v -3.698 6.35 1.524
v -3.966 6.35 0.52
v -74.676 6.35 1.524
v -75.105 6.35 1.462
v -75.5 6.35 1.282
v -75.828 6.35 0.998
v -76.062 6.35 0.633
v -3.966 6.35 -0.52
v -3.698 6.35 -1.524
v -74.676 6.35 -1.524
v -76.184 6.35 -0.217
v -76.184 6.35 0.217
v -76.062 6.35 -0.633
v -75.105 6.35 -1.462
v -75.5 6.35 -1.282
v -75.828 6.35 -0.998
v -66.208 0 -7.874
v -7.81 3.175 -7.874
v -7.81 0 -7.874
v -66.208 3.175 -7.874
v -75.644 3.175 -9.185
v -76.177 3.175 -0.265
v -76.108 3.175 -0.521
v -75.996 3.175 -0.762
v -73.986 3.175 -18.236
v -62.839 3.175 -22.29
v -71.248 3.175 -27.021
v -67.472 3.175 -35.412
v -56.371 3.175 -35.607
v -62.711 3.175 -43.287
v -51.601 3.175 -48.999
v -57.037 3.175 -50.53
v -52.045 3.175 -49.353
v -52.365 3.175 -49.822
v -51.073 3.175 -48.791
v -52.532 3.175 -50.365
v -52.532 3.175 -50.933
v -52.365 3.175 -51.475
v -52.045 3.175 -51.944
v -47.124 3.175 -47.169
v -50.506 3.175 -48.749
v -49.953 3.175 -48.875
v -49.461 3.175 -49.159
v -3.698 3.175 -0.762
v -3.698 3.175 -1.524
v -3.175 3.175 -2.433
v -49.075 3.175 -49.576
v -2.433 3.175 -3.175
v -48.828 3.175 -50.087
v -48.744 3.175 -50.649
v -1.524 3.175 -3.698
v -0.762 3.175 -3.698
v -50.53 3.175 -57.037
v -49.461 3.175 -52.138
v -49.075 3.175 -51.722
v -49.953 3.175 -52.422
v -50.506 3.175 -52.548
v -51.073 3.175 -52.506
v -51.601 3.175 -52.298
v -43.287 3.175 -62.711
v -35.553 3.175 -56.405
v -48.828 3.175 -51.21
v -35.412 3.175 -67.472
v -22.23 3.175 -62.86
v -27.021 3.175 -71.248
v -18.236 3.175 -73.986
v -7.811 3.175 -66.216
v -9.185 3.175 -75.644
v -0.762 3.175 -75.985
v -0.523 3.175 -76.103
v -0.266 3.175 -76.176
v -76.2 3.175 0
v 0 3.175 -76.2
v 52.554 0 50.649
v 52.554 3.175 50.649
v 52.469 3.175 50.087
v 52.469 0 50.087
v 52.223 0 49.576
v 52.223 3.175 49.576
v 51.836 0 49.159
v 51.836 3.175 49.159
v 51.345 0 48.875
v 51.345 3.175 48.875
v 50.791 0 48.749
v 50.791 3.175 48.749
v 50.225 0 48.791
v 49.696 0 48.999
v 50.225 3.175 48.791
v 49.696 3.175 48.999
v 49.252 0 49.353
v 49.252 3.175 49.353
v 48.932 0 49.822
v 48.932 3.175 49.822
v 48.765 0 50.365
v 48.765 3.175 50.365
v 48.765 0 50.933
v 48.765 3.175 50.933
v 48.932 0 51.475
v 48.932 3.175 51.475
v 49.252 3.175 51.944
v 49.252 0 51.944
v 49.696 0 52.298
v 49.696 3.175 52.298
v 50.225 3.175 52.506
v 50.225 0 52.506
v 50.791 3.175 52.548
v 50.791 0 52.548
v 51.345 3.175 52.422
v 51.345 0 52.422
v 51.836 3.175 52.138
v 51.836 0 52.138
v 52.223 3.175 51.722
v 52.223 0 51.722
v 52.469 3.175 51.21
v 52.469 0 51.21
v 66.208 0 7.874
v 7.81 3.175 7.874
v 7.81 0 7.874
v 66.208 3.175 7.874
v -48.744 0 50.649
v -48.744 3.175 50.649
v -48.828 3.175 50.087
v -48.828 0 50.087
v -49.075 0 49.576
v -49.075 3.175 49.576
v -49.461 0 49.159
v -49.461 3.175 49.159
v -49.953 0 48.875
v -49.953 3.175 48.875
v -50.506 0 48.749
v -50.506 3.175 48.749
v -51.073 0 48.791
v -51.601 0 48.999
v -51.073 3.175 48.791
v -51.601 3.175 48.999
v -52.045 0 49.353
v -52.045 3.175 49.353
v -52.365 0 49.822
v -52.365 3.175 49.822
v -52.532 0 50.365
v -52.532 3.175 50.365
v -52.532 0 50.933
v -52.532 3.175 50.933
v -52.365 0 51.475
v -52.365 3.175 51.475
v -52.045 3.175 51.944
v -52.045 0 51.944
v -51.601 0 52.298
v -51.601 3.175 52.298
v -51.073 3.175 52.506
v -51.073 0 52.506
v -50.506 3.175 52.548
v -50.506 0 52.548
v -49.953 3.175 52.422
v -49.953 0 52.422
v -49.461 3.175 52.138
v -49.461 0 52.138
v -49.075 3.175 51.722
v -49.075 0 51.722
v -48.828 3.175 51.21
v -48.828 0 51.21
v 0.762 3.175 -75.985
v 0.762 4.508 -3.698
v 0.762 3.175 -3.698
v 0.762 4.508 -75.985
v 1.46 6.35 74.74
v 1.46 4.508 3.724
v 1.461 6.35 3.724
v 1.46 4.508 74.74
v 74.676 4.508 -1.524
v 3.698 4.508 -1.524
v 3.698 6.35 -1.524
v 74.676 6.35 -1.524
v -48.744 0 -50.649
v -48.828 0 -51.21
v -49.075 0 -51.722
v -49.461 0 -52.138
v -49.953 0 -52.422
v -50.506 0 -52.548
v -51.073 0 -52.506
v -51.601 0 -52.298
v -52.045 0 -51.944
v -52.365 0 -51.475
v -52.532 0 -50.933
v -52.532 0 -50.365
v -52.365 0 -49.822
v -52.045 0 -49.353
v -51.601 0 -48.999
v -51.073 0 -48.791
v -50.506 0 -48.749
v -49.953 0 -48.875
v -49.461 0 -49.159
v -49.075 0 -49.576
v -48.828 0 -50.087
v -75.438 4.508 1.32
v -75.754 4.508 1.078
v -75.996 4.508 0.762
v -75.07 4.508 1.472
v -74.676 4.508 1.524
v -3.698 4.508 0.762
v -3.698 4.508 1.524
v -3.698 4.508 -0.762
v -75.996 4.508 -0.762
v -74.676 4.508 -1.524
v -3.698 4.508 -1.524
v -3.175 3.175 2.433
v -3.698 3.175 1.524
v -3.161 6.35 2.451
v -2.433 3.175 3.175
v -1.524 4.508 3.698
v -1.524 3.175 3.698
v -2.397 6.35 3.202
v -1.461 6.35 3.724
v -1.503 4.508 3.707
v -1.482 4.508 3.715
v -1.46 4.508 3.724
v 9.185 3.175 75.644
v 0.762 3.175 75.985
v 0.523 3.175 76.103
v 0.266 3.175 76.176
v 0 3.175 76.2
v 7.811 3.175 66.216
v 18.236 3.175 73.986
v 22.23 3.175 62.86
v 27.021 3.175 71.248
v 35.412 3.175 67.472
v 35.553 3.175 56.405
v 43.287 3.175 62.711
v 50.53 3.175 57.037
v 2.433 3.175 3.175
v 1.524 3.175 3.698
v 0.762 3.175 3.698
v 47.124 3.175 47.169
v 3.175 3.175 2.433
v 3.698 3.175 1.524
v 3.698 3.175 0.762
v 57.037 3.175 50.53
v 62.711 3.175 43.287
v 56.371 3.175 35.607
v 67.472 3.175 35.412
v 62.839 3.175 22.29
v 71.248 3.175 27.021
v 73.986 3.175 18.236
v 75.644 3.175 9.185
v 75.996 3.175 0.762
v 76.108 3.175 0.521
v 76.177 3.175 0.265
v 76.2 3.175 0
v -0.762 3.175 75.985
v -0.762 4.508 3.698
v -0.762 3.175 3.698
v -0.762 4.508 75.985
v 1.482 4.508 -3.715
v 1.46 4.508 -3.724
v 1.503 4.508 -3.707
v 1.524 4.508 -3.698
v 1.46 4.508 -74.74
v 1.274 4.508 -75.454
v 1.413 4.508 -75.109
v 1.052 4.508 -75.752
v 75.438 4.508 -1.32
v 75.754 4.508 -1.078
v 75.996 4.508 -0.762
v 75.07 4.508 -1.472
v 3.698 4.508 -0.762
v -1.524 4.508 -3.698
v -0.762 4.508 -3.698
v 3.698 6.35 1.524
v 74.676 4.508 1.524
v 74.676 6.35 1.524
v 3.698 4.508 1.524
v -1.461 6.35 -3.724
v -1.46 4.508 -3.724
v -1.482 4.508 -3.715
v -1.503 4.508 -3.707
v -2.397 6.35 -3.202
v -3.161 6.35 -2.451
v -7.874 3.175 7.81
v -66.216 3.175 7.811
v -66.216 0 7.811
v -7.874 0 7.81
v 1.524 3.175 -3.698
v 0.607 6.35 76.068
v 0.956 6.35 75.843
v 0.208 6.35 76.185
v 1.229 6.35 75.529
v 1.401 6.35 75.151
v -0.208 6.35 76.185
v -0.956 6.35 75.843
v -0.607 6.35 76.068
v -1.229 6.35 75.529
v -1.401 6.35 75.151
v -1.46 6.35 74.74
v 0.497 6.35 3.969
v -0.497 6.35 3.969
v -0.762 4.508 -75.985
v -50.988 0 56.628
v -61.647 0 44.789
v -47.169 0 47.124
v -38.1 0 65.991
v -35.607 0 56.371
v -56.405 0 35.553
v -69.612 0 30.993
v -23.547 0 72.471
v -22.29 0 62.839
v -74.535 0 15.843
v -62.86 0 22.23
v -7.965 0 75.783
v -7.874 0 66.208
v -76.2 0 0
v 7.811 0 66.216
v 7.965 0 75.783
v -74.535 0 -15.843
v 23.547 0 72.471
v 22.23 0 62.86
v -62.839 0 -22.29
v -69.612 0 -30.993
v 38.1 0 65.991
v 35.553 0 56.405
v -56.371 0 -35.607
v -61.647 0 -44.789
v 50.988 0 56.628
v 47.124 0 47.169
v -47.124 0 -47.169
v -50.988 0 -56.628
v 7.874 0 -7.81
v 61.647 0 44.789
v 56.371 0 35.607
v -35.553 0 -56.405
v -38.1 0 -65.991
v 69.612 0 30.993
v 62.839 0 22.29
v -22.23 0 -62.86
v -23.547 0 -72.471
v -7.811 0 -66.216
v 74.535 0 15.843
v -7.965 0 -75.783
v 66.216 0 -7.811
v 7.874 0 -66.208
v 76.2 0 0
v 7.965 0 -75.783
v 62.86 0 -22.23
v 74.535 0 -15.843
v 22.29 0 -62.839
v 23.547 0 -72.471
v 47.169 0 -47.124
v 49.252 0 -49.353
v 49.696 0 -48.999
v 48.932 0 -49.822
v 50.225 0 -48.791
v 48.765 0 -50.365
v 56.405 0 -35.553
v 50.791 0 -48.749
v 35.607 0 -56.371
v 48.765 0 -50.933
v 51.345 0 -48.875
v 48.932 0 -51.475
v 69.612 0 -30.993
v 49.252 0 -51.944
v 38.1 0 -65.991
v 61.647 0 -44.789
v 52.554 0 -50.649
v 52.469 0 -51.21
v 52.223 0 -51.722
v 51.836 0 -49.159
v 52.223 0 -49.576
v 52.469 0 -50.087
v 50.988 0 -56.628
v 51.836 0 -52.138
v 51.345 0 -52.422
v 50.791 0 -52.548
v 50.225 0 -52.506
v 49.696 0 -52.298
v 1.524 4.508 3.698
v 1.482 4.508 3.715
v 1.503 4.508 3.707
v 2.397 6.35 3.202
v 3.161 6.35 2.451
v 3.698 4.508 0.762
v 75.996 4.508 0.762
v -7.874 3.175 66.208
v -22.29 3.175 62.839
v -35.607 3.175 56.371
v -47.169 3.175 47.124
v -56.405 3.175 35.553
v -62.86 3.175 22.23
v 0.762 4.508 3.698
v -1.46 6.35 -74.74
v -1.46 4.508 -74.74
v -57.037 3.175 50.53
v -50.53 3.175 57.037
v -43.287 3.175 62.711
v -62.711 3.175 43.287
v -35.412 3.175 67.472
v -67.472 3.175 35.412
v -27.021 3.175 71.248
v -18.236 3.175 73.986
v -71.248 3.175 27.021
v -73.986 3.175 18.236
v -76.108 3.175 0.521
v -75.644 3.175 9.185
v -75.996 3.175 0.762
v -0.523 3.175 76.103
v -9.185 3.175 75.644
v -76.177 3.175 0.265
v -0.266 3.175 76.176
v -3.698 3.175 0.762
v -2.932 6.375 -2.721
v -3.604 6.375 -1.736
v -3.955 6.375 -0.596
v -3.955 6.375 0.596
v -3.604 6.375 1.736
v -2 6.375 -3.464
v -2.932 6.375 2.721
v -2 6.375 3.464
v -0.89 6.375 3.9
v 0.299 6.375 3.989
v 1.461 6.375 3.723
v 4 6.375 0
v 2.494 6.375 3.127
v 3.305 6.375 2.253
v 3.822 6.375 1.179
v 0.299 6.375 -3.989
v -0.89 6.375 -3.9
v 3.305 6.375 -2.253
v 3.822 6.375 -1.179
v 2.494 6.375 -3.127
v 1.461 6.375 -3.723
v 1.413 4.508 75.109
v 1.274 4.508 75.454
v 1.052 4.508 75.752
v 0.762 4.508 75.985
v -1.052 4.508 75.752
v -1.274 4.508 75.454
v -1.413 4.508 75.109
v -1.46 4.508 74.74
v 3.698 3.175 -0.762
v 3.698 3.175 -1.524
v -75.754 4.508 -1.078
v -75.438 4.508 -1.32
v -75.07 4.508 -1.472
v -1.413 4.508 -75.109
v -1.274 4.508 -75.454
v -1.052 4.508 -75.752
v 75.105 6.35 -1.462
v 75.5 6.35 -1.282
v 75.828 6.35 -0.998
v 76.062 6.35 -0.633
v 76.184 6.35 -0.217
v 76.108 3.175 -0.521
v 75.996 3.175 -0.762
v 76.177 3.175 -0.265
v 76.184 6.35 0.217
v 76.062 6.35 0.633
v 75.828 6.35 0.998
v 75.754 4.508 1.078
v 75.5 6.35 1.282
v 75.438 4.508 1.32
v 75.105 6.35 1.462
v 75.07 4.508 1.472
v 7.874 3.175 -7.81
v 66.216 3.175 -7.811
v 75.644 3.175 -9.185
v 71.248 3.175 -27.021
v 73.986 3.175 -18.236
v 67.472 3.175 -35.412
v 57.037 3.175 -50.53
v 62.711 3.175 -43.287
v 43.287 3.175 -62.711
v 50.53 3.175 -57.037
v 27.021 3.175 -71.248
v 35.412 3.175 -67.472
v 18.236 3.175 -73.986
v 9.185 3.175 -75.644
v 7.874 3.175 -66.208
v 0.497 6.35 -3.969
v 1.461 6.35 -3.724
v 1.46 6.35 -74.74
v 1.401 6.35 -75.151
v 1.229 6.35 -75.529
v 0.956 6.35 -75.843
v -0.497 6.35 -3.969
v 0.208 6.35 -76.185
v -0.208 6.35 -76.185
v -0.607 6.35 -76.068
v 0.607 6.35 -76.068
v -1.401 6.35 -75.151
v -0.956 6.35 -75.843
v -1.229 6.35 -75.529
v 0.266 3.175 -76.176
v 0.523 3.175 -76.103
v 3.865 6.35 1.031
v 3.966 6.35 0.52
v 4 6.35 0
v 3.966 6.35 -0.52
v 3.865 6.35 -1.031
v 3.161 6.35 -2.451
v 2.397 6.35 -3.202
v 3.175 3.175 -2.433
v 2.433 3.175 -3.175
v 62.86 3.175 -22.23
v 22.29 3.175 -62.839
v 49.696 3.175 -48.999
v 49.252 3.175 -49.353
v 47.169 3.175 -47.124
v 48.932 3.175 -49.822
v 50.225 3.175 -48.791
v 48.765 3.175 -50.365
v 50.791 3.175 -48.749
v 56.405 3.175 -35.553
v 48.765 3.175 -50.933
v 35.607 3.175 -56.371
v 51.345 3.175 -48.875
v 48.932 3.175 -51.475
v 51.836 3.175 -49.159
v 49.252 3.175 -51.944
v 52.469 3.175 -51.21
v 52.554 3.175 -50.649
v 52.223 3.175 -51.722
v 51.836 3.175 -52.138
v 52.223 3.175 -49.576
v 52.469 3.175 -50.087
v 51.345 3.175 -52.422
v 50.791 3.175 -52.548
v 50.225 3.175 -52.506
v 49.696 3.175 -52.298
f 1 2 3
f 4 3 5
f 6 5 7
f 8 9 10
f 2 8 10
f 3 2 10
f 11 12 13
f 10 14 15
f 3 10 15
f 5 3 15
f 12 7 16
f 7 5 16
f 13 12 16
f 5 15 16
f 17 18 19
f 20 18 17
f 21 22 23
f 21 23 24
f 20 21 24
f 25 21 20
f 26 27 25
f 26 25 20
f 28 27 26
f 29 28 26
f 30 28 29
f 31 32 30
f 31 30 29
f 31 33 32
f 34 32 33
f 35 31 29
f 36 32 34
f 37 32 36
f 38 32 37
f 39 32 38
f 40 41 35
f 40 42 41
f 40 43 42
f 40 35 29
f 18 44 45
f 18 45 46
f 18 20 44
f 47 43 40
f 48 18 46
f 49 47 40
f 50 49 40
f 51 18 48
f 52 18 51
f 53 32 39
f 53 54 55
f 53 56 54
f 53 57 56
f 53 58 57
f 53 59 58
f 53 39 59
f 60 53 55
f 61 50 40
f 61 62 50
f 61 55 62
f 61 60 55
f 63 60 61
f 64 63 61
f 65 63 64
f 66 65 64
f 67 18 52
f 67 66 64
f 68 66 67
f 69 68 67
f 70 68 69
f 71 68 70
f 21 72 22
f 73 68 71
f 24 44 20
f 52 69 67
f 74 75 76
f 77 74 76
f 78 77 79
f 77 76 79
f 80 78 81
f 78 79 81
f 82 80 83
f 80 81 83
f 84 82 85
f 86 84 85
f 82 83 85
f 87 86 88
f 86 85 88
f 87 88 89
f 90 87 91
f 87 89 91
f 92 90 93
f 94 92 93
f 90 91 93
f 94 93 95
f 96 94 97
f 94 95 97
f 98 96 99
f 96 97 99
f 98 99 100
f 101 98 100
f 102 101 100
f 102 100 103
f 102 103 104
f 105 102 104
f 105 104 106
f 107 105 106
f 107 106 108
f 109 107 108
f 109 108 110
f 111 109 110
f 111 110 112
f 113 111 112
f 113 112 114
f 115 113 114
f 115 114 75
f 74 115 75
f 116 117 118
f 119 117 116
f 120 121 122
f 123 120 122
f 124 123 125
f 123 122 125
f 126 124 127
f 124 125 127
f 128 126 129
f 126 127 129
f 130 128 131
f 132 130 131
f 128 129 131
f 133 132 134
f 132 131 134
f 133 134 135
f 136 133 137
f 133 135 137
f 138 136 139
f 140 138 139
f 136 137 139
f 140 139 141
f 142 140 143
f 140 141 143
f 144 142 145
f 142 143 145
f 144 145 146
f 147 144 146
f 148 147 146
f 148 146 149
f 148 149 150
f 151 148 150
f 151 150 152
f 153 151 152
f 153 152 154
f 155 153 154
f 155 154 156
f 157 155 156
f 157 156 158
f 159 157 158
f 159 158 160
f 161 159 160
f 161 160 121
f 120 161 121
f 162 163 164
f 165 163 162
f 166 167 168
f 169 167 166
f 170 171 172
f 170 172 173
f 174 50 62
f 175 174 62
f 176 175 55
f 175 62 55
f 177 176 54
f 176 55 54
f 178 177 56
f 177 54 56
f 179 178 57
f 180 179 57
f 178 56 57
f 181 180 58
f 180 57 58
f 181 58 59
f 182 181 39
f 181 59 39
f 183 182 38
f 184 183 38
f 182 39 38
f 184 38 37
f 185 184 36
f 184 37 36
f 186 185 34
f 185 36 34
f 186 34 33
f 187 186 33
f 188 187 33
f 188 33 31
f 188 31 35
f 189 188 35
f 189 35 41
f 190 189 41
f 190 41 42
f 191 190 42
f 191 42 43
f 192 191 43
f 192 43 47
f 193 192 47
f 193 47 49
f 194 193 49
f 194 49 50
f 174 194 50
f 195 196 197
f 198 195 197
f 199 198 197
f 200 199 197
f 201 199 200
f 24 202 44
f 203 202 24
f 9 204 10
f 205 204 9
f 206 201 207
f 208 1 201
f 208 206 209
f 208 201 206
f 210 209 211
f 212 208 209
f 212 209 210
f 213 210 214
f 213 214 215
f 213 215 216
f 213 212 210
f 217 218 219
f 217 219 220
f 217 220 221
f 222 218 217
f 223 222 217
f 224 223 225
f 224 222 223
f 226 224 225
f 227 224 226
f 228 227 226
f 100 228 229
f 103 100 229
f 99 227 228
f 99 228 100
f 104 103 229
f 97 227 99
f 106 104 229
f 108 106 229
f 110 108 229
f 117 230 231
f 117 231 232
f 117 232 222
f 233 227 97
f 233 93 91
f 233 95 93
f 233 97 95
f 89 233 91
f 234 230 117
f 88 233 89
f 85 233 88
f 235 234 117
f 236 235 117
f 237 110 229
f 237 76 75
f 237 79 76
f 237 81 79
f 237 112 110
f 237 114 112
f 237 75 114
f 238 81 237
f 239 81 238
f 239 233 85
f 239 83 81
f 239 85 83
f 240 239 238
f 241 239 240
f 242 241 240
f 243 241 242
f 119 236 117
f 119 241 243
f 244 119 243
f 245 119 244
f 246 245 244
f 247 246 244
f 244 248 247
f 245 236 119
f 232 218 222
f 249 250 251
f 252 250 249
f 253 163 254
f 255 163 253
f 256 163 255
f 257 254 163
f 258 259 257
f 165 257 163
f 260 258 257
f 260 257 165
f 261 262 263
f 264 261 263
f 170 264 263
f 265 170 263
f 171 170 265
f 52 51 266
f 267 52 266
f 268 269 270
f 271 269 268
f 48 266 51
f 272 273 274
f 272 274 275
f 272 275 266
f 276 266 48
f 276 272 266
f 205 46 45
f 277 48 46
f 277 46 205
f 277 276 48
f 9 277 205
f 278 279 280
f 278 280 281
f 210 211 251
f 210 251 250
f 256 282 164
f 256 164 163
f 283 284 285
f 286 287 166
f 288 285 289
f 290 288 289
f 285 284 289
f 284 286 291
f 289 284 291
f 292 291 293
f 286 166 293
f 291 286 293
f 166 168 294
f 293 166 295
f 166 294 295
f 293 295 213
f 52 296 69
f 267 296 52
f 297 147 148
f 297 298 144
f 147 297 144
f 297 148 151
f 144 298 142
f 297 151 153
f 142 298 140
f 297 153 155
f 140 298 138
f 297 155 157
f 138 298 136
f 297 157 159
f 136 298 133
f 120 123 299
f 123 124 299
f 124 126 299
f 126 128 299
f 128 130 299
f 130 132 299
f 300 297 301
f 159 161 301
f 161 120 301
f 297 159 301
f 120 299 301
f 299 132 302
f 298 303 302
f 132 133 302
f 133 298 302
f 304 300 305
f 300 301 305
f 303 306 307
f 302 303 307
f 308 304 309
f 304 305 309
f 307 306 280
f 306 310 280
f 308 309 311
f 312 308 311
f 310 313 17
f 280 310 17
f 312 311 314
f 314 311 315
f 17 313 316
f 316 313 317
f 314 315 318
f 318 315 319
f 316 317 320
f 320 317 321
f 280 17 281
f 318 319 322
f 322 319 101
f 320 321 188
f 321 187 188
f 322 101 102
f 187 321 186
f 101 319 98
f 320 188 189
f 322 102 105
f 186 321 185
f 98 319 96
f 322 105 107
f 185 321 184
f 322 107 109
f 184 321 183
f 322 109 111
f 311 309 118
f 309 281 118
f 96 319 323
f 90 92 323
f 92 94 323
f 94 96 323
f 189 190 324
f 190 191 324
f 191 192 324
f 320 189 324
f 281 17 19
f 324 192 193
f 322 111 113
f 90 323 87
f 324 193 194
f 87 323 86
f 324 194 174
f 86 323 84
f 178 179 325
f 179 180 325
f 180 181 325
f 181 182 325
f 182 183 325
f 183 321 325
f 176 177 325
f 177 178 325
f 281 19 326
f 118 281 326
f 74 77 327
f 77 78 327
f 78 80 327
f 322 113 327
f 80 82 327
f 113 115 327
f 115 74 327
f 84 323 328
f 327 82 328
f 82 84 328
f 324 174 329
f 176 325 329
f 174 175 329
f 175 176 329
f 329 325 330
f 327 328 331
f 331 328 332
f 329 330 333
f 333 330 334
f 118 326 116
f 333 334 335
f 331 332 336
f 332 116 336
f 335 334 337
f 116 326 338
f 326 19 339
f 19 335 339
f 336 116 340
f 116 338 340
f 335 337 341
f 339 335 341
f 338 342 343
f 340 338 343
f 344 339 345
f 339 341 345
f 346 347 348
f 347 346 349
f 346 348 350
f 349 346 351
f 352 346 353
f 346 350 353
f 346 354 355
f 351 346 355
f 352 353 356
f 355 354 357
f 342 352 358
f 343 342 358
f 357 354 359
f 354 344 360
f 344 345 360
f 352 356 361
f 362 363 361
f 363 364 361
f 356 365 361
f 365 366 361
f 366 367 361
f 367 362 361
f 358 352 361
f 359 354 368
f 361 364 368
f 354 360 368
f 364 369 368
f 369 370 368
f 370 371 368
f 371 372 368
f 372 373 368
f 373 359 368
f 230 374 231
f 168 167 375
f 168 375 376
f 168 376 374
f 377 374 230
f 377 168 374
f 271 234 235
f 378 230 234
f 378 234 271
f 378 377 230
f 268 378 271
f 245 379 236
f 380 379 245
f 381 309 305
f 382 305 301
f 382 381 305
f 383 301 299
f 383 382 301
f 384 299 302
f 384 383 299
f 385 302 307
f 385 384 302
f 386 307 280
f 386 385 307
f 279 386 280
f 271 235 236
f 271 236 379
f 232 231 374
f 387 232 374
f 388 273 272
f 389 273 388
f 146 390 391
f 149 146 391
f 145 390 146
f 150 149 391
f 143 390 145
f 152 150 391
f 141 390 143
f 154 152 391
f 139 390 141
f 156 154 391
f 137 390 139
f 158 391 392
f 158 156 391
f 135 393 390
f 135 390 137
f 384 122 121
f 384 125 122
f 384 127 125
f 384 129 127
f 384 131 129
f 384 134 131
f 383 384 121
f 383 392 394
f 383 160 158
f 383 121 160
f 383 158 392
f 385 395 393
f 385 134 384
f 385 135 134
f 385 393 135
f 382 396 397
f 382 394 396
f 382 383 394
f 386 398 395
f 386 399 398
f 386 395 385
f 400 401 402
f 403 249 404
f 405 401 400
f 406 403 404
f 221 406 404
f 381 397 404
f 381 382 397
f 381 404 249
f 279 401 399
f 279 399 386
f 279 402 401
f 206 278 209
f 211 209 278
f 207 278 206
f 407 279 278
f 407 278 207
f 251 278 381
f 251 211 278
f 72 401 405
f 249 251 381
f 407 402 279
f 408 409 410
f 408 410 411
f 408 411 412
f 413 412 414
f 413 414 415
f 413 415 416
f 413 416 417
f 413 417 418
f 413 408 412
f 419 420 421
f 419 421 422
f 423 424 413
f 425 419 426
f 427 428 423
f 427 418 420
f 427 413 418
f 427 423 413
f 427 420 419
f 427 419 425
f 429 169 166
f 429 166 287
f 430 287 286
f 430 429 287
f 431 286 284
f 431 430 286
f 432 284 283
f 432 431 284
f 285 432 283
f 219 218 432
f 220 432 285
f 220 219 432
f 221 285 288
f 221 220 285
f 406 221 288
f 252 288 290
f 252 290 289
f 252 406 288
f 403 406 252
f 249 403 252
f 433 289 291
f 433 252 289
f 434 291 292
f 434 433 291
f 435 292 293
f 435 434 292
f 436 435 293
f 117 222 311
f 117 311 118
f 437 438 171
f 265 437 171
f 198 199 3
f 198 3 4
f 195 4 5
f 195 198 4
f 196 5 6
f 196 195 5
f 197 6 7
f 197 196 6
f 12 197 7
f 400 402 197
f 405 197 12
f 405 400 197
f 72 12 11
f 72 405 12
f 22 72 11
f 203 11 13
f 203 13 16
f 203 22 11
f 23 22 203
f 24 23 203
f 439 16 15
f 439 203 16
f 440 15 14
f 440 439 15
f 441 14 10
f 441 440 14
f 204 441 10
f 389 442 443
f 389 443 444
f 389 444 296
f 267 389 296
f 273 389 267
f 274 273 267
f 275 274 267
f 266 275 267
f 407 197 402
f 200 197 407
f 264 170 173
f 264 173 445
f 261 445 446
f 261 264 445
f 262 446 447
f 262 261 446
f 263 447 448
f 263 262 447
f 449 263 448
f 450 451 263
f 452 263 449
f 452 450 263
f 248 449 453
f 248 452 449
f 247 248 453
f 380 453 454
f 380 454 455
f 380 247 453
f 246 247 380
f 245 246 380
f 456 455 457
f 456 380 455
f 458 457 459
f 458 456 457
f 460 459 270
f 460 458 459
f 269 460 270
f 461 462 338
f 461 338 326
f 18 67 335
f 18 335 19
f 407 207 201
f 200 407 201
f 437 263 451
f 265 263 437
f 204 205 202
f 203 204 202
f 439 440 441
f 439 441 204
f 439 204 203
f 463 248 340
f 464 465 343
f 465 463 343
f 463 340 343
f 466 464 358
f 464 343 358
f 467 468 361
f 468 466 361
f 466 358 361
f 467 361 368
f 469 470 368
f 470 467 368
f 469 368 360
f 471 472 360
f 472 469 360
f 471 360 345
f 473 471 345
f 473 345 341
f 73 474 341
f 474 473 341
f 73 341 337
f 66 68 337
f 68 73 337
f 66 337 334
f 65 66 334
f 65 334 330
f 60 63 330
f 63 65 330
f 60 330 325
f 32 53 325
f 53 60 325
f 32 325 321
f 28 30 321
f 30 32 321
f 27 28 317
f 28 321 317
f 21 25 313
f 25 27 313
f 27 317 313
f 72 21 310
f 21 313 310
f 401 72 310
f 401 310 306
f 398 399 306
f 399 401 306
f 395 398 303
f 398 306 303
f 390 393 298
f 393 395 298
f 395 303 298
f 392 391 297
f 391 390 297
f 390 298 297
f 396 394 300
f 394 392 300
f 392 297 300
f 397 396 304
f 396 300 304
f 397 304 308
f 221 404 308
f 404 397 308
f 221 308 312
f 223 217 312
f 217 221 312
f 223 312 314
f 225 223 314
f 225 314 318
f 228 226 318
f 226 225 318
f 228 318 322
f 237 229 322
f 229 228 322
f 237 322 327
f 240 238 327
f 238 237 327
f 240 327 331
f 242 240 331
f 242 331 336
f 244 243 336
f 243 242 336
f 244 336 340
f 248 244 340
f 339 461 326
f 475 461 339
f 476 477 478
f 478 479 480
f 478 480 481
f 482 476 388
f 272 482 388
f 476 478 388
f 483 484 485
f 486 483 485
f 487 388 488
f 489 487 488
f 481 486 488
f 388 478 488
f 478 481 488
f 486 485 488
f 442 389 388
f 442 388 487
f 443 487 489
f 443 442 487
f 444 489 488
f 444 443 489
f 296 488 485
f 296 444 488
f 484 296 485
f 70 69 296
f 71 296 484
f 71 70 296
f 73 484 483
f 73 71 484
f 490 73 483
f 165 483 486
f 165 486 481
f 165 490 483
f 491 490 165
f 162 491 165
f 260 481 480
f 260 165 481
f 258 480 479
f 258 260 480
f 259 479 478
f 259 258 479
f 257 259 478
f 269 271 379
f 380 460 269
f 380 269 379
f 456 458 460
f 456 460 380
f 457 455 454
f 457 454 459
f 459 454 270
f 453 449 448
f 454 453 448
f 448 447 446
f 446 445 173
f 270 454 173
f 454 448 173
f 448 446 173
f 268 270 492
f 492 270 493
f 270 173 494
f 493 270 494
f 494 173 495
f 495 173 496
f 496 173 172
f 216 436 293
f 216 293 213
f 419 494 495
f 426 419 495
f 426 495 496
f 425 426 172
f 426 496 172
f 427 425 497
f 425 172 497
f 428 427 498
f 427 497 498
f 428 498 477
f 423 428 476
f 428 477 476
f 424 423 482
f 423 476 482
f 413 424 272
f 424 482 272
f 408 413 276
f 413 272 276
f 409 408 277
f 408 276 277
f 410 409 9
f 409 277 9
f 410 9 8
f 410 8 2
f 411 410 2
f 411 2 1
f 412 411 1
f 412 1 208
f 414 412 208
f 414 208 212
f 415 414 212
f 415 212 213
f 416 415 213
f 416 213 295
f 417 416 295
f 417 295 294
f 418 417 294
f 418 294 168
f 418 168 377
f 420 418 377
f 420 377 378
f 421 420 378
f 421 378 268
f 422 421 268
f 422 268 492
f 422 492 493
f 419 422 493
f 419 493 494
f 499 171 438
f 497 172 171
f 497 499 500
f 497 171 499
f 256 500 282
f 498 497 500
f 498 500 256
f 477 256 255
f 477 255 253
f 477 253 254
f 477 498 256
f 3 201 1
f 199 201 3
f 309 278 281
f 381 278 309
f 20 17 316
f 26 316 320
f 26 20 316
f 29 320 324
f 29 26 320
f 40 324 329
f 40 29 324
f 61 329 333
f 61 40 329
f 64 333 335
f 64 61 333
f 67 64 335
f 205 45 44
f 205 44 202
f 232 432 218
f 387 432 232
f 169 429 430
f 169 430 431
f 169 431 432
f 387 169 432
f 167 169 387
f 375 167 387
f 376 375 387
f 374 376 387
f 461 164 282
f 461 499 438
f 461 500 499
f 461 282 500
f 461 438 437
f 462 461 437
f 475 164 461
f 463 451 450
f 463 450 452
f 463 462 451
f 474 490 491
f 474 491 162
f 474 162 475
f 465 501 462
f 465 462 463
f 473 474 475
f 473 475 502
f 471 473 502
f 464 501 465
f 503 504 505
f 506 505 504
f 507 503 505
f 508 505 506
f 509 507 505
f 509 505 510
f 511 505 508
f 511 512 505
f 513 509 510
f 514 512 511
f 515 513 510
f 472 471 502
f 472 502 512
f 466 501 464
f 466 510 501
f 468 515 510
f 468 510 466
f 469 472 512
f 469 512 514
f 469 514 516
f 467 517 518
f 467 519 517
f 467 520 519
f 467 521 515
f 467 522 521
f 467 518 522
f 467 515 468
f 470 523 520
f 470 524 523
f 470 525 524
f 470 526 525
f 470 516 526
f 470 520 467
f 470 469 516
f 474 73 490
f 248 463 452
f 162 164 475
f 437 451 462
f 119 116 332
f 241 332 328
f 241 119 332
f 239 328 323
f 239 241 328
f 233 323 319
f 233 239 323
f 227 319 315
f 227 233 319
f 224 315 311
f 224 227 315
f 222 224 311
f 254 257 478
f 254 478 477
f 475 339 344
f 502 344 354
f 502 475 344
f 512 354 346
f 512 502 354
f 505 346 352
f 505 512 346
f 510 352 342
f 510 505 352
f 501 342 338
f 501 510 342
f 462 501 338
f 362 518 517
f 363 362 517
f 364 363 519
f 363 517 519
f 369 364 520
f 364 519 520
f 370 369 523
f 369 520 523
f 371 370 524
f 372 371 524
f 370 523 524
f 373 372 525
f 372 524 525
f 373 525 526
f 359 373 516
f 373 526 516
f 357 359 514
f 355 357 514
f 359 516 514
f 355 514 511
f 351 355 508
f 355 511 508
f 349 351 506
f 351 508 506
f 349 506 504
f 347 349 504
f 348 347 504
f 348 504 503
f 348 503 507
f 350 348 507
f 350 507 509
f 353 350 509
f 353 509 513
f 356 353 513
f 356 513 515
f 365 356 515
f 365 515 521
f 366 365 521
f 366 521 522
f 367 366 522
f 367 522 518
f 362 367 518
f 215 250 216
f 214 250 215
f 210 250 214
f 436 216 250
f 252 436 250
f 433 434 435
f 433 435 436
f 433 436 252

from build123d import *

# Parameters (mm, degrees)
SKETCH1_R                = 76.2
BOSS_EXTRUDE1_DEPTH      = 3.175
BOSS_EXTRUDE2_DEPTH      = 3.175
SKETCH3_R                = 4
BOSS_EXTRUDE3_DEPTH      = 0.0254
BOSS_EXTRUDE3_DEPTH_BACK = 6.35
CUT_EXTRUDE1_DEPTH       = 4.175
SKETCH6_W                = 72.50169985
SKETCH6_H                = 1.3335
CUT_EXTRUDE3_DEPTH       = 0.762
CIRPATTERN1_COUNT        = 4
SKETCH7_W                = 74.062567176
SKETCH7_H                = 1.3335
CUT_EXTRUDE4_DEPTH       = 0.762
CIRPATTERN2_COUNT        = 4
SKETCH8_R                = 1.905
CUT_EXTRUDE5_DEPTH       = 4.175


with BuildPart() as part:
    # Sketch1 → Boss-Extrude1 (new body)
    with BuildSketch(Plane(origin=(0, 0, 0), x_dir=(1, 0, 0), z_dir=(0, 1, 0))):
        Circle(SKETCH1_R)
    extrude(amount=BOSS_EXTRUDE1_DEPTH)

    # Sketch2 → Boss-Extrude2 (add)
    with BuildSketch(Plane(origin=(0, 3.175, 0), x_dir=(1, 0, 0), z_dir=(0, 1, 0))):
        with BuildLine():
            Line((-74.676, 1.524), (74.676, 1.524))
            ThreePointArc((74.676, 1.524), (76.2, 0), (74.676, -1.524))
            Line((74.676, -1.524), (-74.676, -1.524))
            ThreePointArc((-74.676, -1.524), (-76.2, 0), (-74.676, 1.524))
        make_face()
        with BuildLine():
            Line((1.4605, 74.7395), (1.4605, -74.7395))
            ThreePointArc((1.4605, -74.7395), (0, -76.2), (-1.4605, -74.7395))
            Line((-1.4605, -74.7395), (-1.4605, 74.7395))
            ThreePointArc((-1.4605, 74.7395), (0, 76.2), (1.4605, 74.7395))
        make_face()
    extrude(amount=BOSS_EXTRUDE2_DEPTH)

    # Sketch3 → Boss-Extrude3 (add, two sides)
    with BuildSketch(Plane(origin=(0, 6.35, 0), x_dir=(1, 0, 0), z_dir=(0, 1, 0))) as boss_extrude3_sk:
        Circle(SKETCH3_R)
    extrude(amount=BOSS_EXTRUDE3_DEPTH)
    extrude(boss_extrude3_sk.sketch, amount=-BOSS_EXTRUDE3_DEPTH_BACK)

    # Sketch4 → Cut-Extrude1 (cut, through all)
    with BuildSketch(Plane(origin=(0, 3.175, 0), x_dir=(1, 0, 0), z_dir=(0, 1, 0))):
        with BuildLine():
            Line((-7.8105, 7.874), (-39.5605, 7.874))
            Line((-39.5605, 7.874), (-63.009920838, 7.874))
            Line((-63.009920838, 7.874), (-66.208426571, 7.874))
            ThreePointArc((-66.208426571, 7.874), (-47.123731651, 47.168946779), (-7.8105, 66.215947586))
            Line((-7.8105, 66.215947586), (-7.8105, 63.017823588))
            Line((-7.8105, 63.017823588), (-7.8105, 7.874))
        make_face()
        with BuildLine():
            Line((7.874, 63.009920838), (7.874, 66.208426571))
            ThreePointArc((7.874, 66.208426571), (47.168946779, 47.123731651), (66.215947586, 7.8105))
            Line((66.215947586, 7.8105), (63.017823588, 7.8105))
            Line((63.017823588, 7.8105), (7.874, 7.8105))
            Line((7.874, 7.8105), (7.874, 39.5605))
            Line((7.874, 39.5605), (7.874, 63.009920838))
        make_face()
        with BuildLine():
            Line((63.009920838, -7.874), (66.208426571, -7.874))
            ThreePointArc((66.208426571, -7.874), (47.123731651, -47.168946779), (7.8105, -66.215947586))
            Line((7.8105, -66.215947586), (7.8105, -63.017823588))
            Line((7.8105, -63.017823588), (7.8105, -7.874))
            Line((7.8105, -7.874), (39.5605, -7.874))
            Line((39.5605, -7.874), (63.009920838, -7.874))
        make_face()
        with BuildLine():
            Line((-7.874, -63.009920838), (-7.874, -66.208426571))
            ThreePointArc((-7.874, -66.208426571), (-47.168946779, -47.123731651), (-66.215947586, -7.8105))
            Line((-66.215947586, -7.8105), (-63.017823588, -7.8105))
            Line((-63.017823588, -7.8105), (-7.874, -7.8105))
            Line((-7.874, -7.8105), (-7.874, -39.5605))
            Line((-7.874, -39.5605), (-7.874, -63.009920838))
        make_face()
    extrude(amount=-CUT_EXTRUDE1_DEPTH, mode=Mode.SUBTRACT)

    # Sketch6 → Cut-Extrude3 (cut)
    with BuildSketch(Plane.XY.offset(1.524)):
        with Locations((39.949150075, 3.84175)):
            Rectangle(SKETCH6_W, SKETCH6_H)
    cut_extrude3 = extrude(amount=-CUT_EXTRUDE3_DEPTH, mode=Mode.SUBTRACT)

    # CirPattern1: Cut-Extrude3 ×4 about axis
    cirpattern1_axis = Axis((0, 0, 0), (0, 1, 0))
    for i in range(1, CIRPATTERN1_COUNT):
        add(cut_extrude3.rotate(cirpattern1_axis, i * 360 / CIRPATTERN1_COUNT), mode=Mode.SUBTRACT)

    # Sketch7 → Cut-Extrude4 (cut)
    with BuildSketch(Plane(origin=(0, 0, -1.524), x_dir=(-1, 0, 0), z_dir=(0, 0, -1))):
        with Locations((-40.729583738, 3.84175)):
            Rectangle(SKETCH7_W, SKETCH7_H)
    cut_extrude4 = extrude(amount=-CUT_EXTRUDE4_DEPTH, mode=Mode.SUBTRACT)

    # CirPattern2: Cut-Extrude4 ×4 about axis
    cirpattern2_axis = Axis((0, 0, 0), (0, 1, 0))
    for i in range(1, CIRPATTERN2_COUNT):
        add(cut_extrude4.rotate(cirpattern2_axis, i * 360 / CIRPATTERN2_COUNT), mode=Mode.SUBTRACT)

    # Sketch8 → Cut-Extrude5 (cut, through all)
    with BuildSketch(Plane(origin=(0, 3.175, 0), x_dir=(1, 0, 0), z_dir=(0, 1, 0))):
        with Locations((-50.648644523, -50.648644523)):
            Circle(SKETCH8_R)
        with Locations((-50.648644523, 50.648644523)):
            Circle(SKETCH8_R)
        with Locations((50.648644523, 50.648644523)):
            Circle(SKETCH8_R)
        with Locations((50.648644523, -50.648644523)):
            Circle(SKETCH8_R)
    extrude(amount=-CUT_EXTRUDE5_DEPTH, mode=Mode.SUBTRACT)


solid = part.part
